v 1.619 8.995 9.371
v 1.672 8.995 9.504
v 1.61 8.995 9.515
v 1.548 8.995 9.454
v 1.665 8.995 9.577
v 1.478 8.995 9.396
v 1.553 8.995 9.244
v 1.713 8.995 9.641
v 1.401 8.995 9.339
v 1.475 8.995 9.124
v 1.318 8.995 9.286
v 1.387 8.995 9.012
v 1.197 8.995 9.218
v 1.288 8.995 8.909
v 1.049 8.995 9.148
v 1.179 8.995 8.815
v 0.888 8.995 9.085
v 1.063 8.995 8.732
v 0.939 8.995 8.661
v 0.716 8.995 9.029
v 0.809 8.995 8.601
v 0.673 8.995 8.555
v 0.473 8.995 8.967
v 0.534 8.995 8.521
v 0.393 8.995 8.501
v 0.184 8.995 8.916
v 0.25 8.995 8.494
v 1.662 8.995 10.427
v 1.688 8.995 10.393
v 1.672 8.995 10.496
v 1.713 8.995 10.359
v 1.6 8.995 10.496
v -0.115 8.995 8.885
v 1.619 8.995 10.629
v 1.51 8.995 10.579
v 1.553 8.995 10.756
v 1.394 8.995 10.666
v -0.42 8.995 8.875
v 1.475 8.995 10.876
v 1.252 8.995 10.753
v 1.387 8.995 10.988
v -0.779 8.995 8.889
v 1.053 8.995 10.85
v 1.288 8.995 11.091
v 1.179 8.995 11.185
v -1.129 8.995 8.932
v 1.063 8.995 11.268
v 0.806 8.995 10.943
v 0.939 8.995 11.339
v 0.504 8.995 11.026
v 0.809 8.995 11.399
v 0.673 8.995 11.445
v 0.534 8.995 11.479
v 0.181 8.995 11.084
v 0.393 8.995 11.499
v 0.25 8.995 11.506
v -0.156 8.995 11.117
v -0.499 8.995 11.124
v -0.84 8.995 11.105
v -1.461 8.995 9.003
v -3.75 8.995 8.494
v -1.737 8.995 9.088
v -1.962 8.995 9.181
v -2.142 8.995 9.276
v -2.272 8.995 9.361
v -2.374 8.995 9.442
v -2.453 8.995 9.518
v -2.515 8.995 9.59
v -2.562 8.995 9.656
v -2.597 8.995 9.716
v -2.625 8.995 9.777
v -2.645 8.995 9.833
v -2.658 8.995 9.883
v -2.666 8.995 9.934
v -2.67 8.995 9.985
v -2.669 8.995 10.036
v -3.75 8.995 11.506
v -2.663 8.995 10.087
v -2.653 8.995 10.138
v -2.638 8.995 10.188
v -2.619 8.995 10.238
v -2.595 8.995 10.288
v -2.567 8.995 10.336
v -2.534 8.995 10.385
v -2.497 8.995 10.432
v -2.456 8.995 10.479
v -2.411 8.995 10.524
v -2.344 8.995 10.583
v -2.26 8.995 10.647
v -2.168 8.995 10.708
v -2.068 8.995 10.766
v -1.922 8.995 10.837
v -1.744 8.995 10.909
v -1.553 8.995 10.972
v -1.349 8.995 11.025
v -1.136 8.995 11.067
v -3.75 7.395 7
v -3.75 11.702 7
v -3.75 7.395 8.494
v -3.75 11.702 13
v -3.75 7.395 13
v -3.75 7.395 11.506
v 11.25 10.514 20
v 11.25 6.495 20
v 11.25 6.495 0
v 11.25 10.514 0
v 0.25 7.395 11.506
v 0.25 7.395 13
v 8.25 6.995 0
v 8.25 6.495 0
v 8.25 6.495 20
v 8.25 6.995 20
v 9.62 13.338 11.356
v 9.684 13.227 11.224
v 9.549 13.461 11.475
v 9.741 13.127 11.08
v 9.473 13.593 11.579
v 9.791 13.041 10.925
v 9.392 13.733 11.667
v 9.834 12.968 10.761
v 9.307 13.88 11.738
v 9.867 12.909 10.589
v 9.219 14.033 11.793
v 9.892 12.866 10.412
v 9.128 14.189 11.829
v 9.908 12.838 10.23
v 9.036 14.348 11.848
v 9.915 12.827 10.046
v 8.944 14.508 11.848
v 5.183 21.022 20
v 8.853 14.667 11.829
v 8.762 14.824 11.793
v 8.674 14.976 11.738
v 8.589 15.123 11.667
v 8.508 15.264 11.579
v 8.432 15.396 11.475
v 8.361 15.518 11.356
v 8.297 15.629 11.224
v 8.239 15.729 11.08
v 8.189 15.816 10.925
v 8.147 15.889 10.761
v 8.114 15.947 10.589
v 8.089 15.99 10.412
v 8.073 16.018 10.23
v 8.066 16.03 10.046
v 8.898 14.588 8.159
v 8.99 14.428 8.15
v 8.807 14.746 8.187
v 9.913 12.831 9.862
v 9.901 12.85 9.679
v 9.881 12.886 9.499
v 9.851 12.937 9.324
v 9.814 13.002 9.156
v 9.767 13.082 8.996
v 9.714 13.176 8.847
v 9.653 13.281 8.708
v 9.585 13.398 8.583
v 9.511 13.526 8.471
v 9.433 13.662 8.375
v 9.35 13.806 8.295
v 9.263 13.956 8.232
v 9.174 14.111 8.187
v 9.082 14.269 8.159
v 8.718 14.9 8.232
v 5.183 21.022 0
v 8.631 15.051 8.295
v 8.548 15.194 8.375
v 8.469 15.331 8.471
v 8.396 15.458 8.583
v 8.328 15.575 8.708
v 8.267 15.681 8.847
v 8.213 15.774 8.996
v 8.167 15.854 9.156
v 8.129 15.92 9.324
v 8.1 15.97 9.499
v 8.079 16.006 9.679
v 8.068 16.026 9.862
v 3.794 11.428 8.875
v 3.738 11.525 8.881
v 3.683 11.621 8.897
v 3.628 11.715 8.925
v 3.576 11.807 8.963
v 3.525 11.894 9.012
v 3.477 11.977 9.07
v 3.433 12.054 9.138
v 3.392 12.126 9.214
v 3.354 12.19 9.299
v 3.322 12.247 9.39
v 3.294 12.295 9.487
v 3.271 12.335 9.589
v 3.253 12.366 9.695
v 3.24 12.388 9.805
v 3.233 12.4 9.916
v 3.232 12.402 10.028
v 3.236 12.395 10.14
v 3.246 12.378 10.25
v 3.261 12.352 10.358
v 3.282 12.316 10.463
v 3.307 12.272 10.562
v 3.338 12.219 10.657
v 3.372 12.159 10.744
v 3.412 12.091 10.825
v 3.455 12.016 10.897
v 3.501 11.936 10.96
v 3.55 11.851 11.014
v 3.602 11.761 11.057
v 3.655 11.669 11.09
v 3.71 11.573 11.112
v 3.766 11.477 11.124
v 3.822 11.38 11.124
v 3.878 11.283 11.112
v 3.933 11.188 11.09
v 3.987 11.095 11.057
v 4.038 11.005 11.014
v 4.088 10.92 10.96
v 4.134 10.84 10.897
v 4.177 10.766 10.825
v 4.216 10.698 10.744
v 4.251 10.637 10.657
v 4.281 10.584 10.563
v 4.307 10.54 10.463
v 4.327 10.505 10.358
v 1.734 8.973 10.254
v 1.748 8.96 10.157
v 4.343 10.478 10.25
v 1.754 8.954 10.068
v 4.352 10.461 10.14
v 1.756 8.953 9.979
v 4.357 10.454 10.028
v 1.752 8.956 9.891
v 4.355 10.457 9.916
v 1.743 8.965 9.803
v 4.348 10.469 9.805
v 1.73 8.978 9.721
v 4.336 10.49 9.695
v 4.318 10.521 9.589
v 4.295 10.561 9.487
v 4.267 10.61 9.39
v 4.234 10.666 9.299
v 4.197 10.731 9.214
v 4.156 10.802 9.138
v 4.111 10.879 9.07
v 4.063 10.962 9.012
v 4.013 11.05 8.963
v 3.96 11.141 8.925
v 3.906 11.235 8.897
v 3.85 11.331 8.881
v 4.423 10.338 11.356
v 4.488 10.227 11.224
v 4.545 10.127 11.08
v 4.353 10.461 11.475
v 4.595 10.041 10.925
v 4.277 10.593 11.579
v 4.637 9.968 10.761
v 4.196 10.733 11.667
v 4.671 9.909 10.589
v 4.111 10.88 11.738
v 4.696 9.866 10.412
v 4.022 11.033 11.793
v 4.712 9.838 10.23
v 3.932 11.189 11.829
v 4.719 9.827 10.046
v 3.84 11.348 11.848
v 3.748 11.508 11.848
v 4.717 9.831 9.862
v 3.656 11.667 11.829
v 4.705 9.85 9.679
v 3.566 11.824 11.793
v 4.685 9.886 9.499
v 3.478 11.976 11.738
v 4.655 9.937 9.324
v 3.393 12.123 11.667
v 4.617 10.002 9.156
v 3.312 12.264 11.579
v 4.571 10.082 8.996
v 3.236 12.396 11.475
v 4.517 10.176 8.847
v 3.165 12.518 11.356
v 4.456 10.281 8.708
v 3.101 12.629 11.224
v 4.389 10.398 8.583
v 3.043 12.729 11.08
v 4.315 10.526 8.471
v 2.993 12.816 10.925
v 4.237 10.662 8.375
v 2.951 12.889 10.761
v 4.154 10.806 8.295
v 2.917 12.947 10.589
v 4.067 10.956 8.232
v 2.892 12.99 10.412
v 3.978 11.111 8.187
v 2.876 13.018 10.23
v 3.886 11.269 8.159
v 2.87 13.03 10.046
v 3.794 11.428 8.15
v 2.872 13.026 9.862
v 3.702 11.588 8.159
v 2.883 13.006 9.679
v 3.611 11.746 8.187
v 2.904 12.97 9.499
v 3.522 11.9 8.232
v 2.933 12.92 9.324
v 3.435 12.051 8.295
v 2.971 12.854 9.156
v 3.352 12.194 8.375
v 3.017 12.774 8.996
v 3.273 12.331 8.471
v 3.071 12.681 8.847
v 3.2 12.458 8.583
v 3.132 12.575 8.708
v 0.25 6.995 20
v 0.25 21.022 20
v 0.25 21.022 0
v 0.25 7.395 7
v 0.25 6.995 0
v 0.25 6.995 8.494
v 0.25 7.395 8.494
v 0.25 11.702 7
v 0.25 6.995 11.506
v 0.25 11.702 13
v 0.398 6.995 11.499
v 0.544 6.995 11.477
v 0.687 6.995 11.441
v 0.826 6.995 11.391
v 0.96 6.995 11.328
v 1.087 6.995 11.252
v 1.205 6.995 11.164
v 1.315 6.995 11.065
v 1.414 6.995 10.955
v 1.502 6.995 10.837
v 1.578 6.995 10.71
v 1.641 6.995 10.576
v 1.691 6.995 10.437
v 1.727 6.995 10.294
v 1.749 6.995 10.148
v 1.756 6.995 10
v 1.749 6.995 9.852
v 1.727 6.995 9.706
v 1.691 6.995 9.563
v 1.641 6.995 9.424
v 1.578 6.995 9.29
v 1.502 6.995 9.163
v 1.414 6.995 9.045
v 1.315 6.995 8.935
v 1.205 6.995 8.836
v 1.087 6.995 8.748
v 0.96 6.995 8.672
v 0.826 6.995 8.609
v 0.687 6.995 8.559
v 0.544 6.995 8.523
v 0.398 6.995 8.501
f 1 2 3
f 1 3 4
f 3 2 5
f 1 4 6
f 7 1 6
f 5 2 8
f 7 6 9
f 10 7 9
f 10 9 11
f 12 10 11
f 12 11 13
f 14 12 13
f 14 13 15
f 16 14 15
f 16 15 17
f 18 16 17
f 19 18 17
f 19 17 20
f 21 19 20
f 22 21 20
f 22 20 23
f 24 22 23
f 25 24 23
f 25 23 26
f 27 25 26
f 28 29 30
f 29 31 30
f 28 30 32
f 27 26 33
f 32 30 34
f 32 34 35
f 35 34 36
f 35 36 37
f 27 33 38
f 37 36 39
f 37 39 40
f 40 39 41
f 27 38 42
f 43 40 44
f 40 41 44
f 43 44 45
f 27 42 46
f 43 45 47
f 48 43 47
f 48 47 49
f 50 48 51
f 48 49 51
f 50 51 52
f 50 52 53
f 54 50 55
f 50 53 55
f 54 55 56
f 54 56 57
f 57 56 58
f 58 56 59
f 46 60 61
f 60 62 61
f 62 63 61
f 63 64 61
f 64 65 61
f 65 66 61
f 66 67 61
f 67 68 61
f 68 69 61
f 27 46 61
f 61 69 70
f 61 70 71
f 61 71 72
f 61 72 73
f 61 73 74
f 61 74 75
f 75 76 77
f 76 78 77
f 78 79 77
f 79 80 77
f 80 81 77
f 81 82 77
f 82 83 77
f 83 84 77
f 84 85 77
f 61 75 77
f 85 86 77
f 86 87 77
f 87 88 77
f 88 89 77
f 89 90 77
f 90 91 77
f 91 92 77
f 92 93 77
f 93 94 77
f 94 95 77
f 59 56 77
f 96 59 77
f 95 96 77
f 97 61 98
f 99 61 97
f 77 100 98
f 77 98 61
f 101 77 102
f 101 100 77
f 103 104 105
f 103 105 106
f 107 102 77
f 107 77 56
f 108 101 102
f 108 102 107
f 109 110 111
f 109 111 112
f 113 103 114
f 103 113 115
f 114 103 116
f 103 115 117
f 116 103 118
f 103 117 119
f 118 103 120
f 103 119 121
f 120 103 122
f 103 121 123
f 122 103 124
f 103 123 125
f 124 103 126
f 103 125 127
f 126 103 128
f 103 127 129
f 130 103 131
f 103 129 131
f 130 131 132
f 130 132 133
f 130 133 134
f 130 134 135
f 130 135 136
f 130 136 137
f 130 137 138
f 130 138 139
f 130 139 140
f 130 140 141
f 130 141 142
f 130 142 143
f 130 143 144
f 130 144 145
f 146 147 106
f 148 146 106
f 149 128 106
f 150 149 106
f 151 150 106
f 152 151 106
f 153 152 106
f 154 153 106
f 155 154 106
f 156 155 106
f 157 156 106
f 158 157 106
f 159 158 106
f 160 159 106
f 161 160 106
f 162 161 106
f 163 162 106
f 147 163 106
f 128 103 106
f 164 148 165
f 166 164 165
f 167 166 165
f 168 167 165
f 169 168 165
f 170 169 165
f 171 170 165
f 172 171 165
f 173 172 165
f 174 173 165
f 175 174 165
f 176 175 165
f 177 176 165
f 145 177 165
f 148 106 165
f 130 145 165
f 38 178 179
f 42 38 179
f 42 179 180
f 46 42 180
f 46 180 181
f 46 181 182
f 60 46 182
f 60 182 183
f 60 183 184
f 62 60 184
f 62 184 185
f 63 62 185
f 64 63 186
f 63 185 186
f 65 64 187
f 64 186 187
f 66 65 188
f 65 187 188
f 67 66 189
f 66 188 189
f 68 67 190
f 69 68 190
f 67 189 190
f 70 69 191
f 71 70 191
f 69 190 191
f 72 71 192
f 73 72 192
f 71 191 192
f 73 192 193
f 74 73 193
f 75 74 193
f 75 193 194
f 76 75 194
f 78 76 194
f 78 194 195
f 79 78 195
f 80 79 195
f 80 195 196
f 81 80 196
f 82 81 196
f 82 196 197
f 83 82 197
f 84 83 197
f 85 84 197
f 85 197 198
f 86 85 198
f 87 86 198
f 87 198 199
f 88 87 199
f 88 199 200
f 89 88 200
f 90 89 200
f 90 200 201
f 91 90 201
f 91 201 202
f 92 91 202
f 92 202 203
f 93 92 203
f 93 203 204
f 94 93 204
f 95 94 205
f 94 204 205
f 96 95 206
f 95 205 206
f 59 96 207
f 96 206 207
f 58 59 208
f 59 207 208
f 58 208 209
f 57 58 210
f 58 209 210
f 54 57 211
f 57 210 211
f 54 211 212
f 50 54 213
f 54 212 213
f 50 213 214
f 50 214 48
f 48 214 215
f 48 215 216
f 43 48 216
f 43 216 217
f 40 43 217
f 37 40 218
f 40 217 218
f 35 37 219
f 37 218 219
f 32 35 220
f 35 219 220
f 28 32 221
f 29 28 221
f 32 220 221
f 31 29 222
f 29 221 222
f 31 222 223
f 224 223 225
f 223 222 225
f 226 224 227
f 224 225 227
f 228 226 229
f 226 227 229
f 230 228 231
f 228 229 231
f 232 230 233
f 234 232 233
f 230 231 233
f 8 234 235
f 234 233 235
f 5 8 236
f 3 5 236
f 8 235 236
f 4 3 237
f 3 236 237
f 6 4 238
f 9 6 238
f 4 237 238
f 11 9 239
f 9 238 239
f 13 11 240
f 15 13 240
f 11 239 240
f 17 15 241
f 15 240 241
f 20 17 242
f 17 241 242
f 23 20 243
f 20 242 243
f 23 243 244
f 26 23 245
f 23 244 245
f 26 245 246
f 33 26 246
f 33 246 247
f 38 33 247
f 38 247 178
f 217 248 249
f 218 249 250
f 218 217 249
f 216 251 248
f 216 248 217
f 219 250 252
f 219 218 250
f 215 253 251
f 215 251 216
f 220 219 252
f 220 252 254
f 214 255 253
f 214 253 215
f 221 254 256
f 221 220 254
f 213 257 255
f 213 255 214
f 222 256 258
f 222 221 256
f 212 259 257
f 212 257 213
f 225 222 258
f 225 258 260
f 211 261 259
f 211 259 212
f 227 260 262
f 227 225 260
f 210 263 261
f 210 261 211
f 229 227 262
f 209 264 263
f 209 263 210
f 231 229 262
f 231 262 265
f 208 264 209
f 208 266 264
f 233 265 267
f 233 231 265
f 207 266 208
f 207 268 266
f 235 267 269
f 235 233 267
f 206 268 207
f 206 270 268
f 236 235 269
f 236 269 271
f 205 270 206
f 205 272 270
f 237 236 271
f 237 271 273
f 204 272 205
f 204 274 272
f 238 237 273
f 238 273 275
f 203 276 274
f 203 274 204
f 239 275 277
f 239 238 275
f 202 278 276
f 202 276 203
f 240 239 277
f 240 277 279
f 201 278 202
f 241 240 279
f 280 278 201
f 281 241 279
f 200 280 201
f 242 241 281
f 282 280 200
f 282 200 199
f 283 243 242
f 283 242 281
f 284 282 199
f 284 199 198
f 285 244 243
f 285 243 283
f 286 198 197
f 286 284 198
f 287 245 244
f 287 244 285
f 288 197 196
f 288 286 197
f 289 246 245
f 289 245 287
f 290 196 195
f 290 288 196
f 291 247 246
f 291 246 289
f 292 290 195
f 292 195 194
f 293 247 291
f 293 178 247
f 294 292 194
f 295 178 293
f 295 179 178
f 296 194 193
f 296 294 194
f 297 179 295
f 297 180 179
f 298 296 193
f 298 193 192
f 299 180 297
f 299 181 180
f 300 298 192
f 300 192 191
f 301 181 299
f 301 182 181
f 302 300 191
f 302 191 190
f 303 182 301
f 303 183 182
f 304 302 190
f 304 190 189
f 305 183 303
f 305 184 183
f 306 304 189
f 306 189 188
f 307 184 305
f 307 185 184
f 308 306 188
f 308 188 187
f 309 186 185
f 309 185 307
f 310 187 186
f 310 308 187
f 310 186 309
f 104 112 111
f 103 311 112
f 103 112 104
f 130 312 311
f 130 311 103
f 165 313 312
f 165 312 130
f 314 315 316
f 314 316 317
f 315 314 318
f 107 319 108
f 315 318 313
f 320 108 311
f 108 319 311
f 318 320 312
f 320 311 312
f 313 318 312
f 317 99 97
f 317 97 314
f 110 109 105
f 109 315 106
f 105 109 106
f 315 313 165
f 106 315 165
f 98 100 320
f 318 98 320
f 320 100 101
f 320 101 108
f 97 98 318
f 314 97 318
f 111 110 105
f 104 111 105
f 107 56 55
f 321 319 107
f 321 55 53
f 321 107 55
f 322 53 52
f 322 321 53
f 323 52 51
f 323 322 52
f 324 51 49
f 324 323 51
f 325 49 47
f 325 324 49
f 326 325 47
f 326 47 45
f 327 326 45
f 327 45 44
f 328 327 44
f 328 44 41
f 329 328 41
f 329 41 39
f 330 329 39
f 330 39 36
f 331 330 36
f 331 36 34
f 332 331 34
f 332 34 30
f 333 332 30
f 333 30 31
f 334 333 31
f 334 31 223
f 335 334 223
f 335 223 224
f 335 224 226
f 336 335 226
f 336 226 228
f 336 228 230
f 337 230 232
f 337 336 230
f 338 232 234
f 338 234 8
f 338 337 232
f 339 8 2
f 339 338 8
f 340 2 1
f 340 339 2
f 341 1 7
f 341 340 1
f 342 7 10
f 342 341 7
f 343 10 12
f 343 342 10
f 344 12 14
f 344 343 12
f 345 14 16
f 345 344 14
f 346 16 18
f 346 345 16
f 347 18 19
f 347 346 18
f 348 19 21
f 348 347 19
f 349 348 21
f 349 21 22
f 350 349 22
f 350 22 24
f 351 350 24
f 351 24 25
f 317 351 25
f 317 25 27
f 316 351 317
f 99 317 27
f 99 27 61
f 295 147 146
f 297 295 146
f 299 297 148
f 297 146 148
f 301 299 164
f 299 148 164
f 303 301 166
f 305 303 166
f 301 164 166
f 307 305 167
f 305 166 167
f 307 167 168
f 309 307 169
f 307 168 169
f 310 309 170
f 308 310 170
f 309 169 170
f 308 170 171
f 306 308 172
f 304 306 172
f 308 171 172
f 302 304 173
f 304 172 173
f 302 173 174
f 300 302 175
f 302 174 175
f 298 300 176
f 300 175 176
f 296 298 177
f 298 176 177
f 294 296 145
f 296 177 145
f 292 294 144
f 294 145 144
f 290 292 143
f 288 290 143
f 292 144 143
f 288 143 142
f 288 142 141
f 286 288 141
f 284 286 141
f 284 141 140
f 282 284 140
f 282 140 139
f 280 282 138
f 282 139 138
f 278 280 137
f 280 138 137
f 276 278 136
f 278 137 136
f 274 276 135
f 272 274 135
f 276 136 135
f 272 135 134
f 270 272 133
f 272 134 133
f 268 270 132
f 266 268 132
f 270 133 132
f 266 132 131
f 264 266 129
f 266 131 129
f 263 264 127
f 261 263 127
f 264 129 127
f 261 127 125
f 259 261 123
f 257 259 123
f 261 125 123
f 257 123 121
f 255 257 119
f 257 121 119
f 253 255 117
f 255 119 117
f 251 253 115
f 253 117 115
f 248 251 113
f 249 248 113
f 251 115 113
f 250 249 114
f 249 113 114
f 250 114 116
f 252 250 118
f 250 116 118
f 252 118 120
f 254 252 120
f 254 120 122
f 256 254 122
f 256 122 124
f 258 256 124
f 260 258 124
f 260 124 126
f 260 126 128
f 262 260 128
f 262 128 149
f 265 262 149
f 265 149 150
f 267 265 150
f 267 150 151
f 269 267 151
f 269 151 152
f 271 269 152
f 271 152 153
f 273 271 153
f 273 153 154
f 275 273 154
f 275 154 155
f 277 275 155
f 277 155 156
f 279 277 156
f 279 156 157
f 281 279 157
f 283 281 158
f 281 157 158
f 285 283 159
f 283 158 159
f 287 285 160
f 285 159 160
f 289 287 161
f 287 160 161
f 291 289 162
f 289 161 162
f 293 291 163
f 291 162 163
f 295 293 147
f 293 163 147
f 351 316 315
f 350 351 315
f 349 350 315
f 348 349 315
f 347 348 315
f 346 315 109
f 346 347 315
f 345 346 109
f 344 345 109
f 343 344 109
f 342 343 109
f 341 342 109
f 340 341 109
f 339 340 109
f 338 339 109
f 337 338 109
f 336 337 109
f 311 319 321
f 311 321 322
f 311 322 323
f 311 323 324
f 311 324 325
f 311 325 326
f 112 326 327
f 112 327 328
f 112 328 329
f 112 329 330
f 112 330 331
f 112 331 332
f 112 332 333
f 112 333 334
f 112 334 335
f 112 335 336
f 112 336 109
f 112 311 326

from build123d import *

# Parameters (mm, degrees)
EXTRUDE_1_DEPTH     = 20
SKETCH_2_R          = 1.85
CUT_EXTRUDE_1_DEPTH = 6
SKETCH_3_R          = 1.125
CUT_EXTRUDE_2_DEPTH = 20.825317547
SKETCH_4_OUTSIDE_W  = 36.206
SKETCH_4_OUTSIDE_H  = 39.867
CUT_EXTRUDE_3_DEPTH = 21
SKETCH_5_W          = 4
SKETCH_5_H          = 15
SKETCH_5_H_2        = 0.9
CUT_EXTRUDE_4_DEPTH = 21
SKETCH_6_W          = 4
SKETCH_6_H          = 7
CUT_EXTRUDE_5_DEPTH = 6.207259422
SKETCH_7_W          = 8
SKETCH_7_H          = 0.5
CUT_EXTRUDE_6_DEPTH = 21
CUT_EXTRUDE_7_DEPTH = 2


with BuildPart() as part:
    # Эскиз1 → Бобышка-Вытянуть1 (new body)
    with BuildSketch(Plane.XY):
        Polygon((-12.5, 21.650635095), (0, 0), (12.990381057, 7.5), (0.490381057, 29.150635095), align=None)
    extrude(amount=EXTRUDE_1_DEPTH)

    # Эскиз2 → Вырез-Вытянуть1 (cut)
    with BuildSketch(Plane(origin=(12.990381057, 7.5, 0), x_dir=(0, 0, -1), z_dir=(0.866025404, 0.5, 0))):
        with Locations((-10, 8)):
            Circle(SKETCH_2_R)
    extrude(amount=-CUT_EXTRUDE_1_DEPTH, mode=Mode.SUBTRACT)

    # Эскиз3 → Вырез-Вытянуть2 (cut, through all)
    with BuildSketch(Plane(origin=(7.794228634, 4.5, 0), x_dir=(0, 0, -1), z_dir=(0.866025404, 0.5, 0))):
        with Locations((-10, 8)):
            Circle(SKETCH_3_R)
    extrude(amount=-CUT_EXTRUDE_2_DEPTH, mode=Mode.SUBTRACT)

    # Эскиз4 outside → Вырез-Вытянуть3 (cut, through all)
    with BuildSketch(Plane.XY.offset(20)):
        with Locations((0.245, 14.5755)):
            Rectangle(SKETCH_4_OUTSIDE_W, SKETCH_4_OUTSIDE_H)
        Polygon((-3.75, 6.495190528), (11.25, 6.495190528), (11.25, 10.514428415), (1.903841409, 26.70244995), (-3.75, 26.70244995), align=None, mode=Mode.SUBTRACT)
    extrude(amount=-CUT_EXTRUDE_3_DEPTH, mode=Mode.SUBTRACT)

    # Эскиз5 → Вырез-Вытянуть4 (cut, through all)
    with BuildSketch(Plane.XY.offset(20)):
        with Locations((-1.75, 19.20244995)):
            Rectangle(SKETCH_5_W, SKETCH_5_H)
        with Locations((-1.75, 6.945190528)):
            Rectangle(SKETCH_5_W, SKETCH_5_H_2)
    extrude(amount=-CUT_EXTRUDE_4_DEPTH, mode=Mode.SUBTRACT)

    # Эскиз6 → Вырез-Вытянуть5 (cut, through all)
    with BuildSketch(Plane(origin=(0, 11.70244995, 0), x_dir=(1, 0, 0), z_dir=(0, 1, 0))):
        with Locations((-1.75, -16.5)):
            Rectangle(SKETCH_6_W, SKETCH_6_H)
        with Locations((-1.75, -3.5)):
            Rectangle(SKETCH_6_W, SKETCH_6_H)
    extrude(amount=-CUT_EXTRUDE_5_DEPTH, mode=Mode.SUBTRACT)

    # Эскиз7 → Вырез-Вытянуть6 (cut, through all)
    with BuildSketch(Plane.XY.offset(20)):
        Polygon((0.25, 21.022474586), (5.183176715, 21.022474586), (1.903841409, 26.70244995), (0.25, 26.70244995), align=None)
        with Locations((4.25, 6.745190528)):
            Rectangle(SKETCH_7_W, SKETCH_7_H)
    extrude(amount=-CUT_EXTRUDE_6_DEPTH, mode=Mode.SUBTRACT)

    # Эскиз8 → Вырез-Вытянуть7 (cut)
    with BuildSketch(Plane.XZ.offset(-6.995190528)):
        with BuildLine():
            Line((-3.75, 11.505998369), (0.25, 11.505998369))
            ThreePointArc((0.25, 11.505998369), (1.755998369, 10), (0.25, 8.494001631))
            Line((0.25, 8.494001631), (-3.75, 8.494001631))
            Line((-3.75, 8.494001631), (-3.75, 11.505998369))
        make_face()
    extrude(amount=-CUT_EXTRUDE_7_DEPTH, mode=Mode.SUBTRACT)


solid = part.part
